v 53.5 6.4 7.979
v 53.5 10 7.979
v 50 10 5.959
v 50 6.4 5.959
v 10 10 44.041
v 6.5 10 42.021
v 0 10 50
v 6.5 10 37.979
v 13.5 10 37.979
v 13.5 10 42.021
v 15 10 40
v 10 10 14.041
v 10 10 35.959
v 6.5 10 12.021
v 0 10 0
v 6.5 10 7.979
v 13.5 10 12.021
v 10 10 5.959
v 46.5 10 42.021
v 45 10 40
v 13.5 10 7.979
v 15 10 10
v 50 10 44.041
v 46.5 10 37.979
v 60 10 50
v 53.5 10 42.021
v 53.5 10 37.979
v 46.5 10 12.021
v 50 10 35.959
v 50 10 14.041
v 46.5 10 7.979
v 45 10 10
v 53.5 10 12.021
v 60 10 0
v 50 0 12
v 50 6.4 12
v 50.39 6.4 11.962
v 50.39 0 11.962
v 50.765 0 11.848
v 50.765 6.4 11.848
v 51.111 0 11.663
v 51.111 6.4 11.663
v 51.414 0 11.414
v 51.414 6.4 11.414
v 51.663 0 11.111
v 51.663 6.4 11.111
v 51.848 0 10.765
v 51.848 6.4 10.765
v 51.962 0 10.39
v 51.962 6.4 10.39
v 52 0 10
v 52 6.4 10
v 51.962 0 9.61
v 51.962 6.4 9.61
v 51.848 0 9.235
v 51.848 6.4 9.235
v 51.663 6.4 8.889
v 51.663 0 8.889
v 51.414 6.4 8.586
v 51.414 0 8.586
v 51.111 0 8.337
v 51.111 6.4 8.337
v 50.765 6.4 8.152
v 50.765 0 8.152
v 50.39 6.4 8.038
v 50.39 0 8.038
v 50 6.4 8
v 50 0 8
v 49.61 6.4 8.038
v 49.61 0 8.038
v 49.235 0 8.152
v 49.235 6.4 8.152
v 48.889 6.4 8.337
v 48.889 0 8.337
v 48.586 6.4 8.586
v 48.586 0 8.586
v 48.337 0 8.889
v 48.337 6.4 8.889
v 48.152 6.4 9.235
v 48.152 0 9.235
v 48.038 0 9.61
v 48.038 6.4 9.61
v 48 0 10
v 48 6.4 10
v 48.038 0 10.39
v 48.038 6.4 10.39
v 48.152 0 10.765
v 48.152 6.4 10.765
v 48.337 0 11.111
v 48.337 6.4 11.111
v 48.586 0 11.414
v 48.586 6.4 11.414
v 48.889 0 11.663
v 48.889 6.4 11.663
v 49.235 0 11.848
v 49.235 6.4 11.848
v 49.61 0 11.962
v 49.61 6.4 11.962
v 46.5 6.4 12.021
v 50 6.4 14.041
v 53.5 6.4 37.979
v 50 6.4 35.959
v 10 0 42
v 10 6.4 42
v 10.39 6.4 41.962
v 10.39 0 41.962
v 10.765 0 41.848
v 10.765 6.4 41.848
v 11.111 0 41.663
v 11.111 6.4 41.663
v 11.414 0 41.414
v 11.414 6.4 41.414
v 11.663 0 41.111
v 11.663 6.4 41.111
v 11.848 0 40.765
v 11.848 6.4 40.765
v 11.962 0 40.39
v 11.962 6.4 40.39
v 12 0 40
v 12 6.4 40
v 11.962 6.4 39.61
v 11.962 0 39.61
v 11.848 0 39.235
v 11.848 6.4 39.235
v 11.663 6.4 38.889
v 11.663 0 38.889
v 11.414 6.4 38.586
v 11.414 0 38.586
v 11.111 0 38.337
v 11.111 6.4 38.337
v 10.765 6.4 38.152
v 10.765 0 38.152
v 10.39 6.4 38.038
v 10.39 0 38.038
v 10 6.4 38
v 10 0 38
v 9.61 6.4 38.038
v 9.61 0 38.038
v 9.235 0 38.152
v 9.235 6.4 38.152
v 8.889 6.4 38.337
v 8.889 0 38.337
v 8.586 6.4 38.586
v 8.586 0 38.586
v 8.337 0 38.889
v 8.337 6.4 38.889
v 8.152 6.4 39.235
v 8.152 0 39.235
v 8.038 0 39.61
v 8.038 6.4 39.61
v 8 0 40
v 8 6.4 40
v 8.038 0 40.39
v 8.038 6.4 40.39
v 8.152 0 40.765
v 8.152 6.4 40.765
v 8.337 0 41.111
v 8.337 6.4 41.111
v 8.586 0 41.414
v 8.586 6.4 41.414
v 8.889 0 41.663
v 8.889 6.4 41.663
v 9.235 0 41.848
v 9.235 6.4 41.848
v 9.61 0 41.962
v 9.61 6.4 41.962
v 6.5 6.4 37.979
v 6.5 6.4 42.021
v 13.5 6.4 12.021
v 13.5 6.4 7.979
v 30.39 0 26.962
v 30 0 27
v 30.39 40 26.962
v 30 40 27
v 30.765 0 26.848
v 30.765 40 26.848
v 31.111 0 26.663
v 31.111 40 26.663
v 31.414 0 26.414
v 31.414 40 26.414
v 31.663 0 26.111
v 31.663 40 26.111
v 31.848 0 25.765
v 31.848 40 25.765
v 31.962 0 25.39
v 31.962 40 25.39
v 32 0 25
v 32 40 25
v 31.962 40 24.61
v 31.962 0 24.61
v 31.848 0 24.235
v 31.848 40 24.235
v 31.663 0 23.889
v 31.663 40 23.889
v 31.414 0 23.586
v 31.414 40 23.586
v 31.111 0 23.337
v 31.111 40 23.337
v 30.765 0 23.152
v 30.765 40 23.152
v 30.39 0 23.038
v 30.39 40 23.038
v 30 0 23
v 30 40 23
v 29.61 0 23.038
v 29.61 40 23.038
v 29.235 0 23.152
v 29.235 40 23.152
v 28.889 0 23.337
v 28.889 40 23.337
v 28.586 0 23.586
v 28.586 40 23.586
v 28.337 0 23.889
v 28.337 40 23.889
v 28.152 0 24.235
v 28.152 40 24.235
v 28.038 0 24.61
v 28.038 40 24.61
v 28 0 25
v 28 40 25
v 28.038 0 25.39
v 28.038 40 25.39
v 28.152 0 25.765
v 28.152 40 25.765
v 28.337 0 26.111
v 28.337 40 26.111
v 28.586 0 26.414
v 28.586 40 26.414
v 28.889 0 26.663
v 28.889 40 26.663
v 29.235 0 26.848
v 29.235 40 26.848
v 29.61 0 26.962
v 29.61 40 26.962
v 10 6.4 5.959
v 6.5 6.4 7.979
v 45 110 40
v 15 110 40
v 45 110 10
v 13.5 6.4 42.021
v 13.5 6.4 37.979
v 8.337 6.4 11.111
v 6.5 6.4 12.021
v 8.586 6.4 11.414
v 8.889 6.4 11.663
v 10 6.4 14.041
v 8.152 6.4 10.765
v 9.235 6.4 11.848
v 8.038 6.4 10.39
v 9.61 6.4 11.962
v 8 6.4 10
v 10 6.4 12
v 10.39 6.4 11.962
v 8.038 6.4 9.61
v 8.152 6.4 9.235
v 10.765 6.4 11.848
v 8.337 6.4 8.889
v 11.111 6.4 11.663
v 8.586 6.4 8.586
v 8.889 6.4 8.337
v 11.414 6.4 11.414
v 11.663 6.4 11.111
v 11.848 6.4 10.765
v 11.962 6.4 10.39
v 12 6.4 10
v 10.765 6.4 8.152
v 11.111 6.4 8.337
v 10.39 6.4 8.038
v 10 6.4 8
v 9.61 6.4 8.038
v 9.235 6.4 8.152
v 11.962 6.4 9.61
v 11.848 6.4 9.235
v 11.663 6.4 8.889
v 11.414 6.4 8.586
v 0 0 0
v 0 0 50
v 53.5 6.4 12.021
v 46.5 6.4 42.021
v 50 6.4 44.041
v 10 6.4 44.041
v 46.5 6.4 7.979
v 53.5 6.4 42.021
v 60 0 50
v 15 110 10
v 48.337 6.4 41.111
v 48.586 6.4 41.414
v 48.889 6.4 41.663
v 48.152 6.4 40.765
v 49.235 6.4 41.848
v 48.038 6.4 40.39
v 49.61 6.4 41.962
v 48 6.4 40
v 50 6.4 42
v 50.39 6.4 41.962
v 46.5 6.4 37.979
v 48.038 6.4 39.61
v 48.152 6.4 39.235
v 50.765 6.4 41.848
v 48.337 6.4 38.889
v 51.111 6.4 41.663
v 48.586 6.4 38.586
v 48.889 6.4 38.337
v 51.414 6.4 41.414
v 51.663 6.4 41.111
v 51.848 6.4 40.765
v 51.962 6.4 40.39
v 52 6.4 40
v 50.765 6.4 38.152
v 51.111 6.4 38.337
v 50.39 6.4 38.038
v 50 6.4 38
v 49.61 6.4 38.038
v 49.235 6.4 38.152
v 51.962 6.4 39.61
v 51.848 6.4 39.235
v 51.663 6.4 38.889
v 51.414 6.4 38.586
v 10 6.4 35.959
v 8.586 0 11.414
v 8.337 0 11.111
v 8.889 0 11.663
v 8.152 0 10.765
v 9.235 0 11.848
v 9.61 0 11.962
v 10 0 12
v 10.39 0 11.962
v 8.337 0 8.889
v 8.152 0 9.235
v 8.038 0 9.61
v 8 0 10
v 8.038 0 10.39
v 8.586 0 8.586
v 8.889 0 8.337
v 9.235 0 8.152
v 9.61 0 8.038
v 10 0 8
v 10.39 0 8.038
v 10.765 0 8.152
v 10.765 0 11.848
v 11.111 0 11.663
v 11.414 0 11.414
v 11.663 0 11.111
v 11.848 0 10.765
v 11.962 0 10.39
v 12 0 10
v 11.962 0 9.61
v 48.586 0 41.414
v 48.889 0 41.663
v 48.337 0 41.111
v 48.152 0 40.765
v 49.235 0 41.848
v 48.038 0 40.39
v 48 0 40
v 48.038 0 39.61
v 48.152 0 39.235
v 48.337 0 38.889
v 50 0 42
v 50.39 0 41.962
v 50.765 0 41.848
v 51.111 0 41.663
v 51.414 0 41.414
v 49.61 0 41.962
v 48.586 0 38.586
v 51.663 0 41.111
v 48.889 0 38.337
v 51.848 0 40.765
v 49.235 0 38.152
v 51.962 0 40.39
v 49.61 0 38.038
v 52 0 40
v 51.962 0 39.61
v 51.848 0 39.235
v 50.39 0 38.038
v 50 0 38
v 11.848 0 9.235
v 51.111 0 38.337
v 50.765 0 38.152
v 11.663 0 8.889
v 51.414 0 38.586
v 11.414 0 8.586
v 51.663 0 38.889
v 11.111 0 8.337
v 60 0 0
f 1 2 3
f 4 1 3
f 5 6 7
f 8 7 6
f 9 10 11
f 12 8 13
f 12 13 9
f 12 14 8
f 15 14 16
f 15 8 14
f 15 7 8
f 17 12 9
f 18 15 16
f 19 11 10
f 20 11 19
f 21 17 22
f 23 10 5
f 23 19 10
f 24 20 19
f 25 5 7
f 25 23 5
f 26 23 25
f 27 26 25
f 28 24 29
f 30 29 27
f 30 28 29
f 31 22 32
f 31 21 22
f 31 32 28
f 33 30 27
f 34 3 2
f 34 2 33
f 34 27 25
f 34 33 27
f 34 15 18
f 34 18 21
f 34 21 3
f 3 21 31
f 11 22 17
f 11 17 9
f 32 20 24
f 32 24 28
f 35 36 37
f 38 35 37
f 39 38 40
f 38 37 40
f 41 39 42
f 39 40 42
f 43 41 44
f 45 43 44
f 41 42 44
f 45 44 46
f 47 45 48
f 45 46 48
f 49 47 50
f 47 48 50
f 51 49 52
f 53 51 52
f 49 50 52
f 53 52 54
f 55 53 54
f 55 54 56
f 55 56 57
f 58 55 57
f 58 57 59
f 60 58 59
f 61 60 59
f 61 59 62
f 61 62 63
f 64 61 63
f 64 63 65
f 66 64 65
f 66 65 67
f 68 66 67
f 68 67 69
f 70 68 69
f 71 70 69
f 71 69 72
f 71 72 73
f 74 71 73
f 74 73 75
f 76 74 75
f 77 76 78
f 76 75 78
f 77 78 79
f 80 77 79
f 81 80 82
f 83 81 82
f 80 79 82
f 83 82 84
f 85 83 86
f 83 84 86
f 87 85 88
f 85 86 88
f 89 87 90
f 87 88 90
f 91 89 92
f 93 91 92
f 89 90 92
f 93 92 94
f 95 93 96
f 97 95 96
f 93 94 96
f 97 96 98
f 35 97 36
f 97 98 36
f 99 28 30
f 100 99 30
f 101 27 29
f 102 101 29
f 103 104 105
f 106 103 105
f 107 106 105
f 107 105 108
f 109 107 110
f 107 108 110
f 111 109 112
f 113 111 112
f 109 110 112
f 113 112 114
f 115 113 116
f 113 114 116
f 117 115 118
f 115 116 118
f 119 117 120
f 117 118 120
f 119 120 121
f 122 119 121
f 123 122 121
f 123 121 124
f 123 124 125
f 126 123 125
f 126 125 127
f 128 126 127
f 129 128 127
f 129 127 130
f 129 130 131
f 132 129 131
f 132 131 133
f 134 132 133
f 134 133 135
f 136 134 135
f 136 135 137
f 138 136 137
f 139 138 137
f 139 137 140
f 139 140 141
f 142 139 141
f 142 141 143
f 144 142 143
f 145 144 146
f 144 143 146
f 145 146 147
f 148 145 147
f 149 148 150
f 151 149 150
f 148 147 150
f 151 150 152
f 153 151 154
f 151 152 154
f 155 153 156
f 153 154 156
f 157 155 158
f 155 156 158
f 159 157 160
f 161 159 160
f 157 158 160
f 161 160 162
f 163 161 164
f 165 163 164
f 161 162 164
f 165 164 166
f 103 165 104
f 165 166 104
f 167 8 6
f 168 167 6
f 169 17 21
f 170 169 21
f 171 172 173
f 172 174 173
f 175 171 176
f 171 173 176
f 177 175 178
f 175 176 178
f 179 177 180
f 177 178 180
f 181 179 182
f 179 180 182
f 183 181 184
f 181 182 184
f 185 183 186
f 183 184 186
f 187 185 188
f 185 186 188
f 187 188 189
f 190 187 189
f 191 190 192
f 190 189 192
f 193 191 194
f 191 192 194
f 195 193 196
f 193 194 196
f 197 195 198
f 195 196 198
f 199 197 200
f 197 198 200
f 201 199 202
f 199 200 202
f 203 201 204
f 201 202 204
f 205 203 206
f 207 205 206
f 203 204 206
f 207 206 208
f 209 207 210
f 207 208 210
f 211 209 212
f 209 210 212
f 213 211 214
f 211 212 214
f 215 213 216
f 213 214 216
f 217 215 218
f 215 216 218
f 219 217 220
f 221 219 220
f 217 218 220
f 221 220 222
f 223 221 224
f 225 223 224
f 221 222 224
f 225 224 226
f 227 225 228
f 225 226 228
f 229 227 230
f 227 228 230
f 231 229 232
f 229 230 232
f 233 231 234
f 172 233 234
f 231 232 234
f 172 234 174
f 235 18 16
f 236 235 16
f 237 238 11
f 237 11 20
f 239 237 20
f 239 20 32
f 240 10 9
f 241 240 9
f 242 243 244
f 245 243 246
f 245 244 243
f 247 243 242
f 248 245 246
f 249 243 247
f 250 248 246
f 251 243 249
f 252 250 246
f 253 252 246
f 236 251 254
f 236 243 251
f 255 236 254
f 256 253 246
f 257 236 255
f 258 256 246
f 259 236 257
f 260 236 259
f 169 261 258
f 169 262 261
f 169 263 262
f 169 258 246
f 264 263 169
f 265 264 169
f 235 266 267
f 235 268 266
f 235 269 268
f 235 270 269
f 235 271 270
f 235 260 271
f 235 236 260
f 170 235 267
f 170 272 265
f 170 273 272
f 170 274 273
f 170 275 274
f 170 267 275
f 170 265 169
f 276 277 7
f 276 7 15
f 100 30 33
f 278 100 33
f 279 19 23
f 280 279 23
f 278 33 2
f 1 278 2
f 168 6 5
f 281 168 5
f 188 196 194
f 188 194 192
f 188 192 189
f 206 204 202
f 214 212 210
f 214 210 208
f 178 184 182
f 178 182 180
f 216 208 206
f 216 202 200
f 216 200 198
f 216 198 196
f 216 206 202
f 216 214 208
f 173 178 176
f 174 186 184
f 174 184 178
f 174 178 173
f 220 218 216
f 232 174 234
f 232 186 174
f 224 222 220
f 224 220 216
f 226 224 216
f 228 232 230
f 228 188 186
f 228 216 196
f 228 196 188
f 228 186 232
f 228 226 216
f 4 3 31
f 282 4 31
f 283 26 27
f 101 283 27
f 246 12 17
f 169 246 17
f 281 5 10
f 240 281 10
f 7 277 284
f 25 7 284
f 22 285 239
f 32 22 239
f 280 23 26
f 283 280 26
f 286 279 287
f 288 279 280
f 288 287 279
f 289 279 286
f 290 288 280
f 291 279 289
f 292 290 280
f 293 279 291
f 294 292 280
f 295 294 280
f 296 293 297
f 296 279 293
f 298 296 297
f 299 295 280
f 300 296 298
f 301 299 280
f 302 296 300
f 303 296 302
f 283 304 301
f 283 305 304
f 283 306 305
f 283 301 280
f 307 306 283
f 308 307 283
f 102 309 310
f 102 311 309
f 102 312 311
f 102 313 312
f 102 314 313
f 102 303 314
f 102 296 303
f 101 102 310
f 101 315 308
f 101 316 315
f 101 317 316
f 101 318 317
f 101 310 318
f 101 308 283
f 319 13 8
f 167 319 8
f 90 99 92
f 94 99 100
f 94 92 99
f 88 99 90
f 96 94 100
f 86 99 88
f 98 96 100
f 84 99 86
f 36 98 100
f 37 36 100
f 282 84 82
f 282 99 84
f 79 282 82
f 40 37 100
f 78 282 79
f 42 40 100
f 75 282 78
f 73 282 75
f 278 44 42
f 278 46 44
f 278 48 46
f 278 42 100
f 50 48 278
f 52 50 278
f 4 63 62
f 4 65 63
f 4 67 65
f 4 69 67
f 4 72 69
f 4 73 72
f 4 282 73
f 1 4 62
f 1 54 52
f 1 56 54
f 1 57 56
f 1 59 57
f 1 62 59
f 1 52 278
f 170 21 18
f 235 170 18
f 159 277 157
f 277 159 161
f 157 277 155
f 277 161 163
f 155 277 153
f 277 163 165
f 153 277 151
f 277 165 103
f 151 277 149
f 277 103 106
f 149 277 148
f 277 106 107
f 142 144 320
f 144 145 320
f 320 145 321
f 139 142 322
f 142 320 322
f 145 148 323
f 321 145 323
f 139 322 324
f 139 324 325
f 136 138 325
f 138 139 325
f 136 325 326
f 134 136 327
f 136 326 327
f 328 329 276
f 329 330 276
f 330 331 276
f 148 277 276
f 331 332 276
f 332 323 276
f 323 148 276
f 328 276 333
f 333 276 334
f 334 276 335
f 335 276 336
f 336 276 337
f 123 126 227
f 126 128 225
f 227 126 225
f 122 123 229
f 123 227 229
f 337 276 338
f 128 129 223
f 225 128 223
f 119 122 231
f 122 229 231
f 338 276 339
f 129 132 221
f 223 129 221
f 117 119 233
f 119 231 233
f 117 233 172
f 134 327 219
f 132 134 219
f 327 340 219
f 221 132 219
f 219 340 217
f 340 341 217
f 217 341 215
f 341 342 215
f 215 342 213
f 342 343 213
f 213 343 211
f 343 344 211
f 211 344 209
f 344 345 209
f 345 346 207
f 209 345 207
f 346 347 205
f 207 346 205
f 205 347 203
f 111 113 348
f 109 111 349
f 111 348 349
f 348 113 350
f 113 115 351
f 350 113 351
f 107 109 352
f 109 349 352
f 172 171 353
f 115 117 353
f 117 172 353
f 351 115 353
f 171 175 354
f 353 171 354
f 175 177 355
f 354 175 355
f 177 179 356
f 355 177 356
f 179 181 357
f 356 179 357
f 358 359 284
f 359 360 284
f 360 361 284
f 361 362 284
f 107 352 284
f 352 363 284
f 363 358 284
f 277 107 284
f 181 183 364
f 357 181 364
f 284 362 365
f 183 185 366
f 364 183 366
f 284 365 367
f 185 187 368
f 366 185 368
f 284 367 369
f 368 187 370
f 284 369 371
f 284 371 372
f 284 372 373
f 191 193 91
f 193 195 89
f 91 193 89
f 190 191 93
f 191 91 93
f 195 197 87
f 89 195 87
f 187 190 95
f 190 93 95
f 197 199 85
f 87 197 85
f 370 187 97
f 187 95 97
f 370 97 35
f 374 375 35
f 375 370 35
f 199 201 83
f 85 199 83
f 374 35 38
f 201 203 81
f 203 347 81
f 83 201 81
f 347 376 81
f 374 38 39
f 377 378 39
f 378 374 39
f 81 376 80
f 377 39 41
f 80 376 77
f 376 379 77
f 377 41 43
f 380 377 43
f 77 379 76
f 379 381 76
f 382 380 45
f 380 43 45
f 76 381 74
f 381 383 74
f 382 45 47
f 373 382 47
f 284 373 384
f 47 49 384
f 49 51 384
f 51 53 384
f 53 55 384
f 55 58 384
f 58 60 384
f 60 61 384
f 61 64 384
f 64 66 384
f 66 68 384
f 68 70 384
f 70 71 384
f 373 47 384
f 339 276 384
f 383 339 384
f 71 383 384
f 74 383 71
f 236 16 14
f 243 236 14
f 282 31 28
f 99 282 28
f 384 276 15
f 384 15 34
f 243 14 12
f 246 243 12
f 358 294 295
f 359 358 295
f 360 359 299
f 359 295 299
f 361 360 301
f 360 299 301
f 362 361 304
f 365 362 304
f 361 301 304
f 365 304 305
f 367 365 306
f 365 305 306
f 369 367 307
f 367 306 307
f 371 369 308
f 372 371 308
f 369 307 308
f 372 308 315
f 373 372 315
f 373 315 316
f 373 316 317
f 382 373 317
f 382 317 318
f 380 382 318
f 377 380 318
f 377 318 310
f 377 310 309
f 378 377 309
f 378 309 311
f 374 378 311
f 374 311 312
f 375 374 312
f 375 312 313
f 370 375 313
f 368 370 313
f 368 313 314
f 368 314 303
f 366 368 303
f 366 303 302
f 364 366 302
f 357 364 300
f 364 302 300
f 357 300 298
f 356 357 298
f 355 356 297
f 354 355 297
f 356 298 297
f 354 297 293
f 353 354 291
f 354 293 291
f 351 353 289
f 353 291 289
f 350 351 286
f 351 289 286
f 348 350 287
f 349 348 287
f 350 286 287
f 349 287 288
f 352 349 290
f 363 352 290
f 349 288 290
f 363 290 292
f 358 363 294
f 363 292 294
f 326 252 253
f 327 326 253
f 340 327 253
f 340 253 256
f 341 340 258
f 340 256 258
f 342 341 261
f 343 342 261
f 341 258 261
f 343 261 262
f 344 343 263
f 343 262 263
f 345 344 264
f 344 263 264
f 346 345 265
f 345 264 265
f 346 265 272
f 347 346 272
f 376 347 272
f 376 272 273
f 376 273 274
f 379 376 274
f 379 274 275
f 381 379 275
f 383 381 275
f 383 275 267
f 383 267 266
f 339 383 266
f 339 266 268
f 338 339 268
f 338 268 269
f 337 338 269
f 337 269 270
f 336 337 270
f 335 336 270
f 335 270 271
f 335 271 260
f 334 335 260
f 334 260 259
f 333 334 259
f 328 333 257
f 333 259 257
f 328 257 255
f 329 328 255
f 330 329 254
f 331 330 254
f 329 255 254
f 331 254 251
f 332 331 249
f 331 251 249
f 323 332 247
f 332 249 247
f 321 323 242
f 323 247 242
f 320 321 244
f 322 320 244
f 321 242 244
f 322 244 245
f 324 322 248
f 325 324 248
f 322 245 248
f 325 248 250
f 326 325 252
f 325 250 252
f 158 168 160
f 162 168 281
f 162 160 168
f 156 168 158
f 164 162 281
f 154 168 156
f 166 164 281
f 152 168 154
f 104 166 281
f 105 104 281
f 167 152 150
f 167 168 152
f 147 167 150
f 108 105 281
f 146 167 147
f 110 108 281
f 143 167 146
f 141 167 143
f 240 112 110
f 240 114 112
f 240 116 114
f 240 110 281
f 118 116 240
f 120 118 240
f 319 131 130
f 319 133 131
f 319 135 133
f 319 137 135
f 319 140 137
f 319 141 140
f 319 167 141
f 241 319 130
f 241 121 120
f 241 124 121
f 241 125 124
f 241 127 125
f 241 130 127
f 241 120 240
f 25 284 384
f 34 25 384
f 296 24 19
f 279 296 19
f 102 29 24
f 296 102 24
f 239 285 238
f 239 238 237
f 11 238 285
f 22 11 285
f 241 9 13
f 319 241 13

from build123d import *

# Parameters (mm, degrees)
SKETCH1_W           = 60
SKETCH1_H           = 50
BOSS_EXTRUDE1_DEPTH = 10
SKETCH2_R           = 2
CUT_EXTRUDE1_DEPTH  = 79.74007874
CUT_EXTRUDE2_DEPTH  = 3.6
SKETCH4_W           = 30
SKETCH4_H           = 30
BOSS_EXTRUDE2_DEPTH = 100
CUT_EXTRUDE5_START  = -30
SKETCH6_R           = 2
CUT_EXTRUDE5_DEPTH  = 30


with BuildPart() as part:
    # Sketch1 → Boss-Extrude1 (new body)
    with BuildSketch(Plane(origin=(0, 0, 0), x_dir=(1, 0, 0), z_dir=(0, 1, 0))):
        with Locations((30, -25)):
            Rectangle(SKETCH1_W, SKETCH1_H)
    extrude(amount=BOSS_EXTRUDE1_DEPTH)

    # Sketch2 → Cut-Extrude1 (cut, through all)
    with BuildSketch(Plane(origin=(0, 10, 0), x_dir=(1, 0, 0), z_dir=(0, 1, 0))):
        with Locations(Location((50, -10, 0), (0, 0, 270))):
            Circle(SKETCH2_R)
        with Locations(Location((10, -10, 0), (0, 0, 270))):
            Circle(SKETCH2_R)
        with Locations(Location((10, -40, 0), (0, 0, 270))):
            Circle(SKETCH2_R)
        with Locations(Location((50, -40, 0), (0, 0, 270))):
            Circle(SKETCH2_R)
        with Locations(Location((30, -25, 0), (0, 0, 270))):
            Circle(SKETCH2_R)
    extrude(amount=-CUT_EXTRUDE1_DEPTH, mode=Mode.SUBTRACT)

    # Sketch3 → Cut-Extrude2 (cut)
    with BuildSketch(Plane(origin=(0, 10, 0), x_dir=(1, 0, 0), z_dir=(0, 1, 0))):
        Polygon((10, -35.958548116), (6.5, -37.979274058), (6.5, -42.020725942), (10, -44.041451884), (13.5, -42.020725942), (13.5, -37.979274058), align=None)
        Polygon((50, -35.958548116), (46.5, -37.979274058), (46.5, -42.020725942), (50, -44.041451884), (53.5, -42.020725942), (53.5, -37.979274058), align=None)
        Polygon((50, -5.958548116), (46.5, -7.979274058), (46.5, -12.020725942), (50, -14.041451884), (53.5, -12.020725942), (53.5, -7.979274058), align=None)
        Polygon((10, -5.958548116), (6.5, -7.979274058), (6.5, -12.020725942), (10, -14.041451884), (13.5, -12.020725942), (13.5, -7.979274058), align=None)
    extrude(amount=-CUT_EXTRUDE2_DEPTH, mode=Mode.SUBTRACT)

    # Sketch4 → Boss-Extrude2 (add)
    with BuildSketch(Plane(origin=(0, 10, 0), x_dir=(1, 0, 0), z_dir=(0, 1, 0))):
        with Locations((30, -25)):
            Rectangle(SKETCH4_W, SKETCH4_H)
    extrude(amount=BOSS_EXTRUDE2_DEPTH)

    # Sketch6 → Cut-Extrude5 (cut)
    with BuildSketch(Plane.XZ.offset(-10).offset(CUT_EXTRUDE5_START)):
        with Locations(Location((30, 25, 0), (0, 0, 90))):
            Circle(SKETCH6_R)
    extrude(amount=CUT_EXTRUDE5_DEPTH, mode=Mode.SUBTRACT)


solid = part.part
